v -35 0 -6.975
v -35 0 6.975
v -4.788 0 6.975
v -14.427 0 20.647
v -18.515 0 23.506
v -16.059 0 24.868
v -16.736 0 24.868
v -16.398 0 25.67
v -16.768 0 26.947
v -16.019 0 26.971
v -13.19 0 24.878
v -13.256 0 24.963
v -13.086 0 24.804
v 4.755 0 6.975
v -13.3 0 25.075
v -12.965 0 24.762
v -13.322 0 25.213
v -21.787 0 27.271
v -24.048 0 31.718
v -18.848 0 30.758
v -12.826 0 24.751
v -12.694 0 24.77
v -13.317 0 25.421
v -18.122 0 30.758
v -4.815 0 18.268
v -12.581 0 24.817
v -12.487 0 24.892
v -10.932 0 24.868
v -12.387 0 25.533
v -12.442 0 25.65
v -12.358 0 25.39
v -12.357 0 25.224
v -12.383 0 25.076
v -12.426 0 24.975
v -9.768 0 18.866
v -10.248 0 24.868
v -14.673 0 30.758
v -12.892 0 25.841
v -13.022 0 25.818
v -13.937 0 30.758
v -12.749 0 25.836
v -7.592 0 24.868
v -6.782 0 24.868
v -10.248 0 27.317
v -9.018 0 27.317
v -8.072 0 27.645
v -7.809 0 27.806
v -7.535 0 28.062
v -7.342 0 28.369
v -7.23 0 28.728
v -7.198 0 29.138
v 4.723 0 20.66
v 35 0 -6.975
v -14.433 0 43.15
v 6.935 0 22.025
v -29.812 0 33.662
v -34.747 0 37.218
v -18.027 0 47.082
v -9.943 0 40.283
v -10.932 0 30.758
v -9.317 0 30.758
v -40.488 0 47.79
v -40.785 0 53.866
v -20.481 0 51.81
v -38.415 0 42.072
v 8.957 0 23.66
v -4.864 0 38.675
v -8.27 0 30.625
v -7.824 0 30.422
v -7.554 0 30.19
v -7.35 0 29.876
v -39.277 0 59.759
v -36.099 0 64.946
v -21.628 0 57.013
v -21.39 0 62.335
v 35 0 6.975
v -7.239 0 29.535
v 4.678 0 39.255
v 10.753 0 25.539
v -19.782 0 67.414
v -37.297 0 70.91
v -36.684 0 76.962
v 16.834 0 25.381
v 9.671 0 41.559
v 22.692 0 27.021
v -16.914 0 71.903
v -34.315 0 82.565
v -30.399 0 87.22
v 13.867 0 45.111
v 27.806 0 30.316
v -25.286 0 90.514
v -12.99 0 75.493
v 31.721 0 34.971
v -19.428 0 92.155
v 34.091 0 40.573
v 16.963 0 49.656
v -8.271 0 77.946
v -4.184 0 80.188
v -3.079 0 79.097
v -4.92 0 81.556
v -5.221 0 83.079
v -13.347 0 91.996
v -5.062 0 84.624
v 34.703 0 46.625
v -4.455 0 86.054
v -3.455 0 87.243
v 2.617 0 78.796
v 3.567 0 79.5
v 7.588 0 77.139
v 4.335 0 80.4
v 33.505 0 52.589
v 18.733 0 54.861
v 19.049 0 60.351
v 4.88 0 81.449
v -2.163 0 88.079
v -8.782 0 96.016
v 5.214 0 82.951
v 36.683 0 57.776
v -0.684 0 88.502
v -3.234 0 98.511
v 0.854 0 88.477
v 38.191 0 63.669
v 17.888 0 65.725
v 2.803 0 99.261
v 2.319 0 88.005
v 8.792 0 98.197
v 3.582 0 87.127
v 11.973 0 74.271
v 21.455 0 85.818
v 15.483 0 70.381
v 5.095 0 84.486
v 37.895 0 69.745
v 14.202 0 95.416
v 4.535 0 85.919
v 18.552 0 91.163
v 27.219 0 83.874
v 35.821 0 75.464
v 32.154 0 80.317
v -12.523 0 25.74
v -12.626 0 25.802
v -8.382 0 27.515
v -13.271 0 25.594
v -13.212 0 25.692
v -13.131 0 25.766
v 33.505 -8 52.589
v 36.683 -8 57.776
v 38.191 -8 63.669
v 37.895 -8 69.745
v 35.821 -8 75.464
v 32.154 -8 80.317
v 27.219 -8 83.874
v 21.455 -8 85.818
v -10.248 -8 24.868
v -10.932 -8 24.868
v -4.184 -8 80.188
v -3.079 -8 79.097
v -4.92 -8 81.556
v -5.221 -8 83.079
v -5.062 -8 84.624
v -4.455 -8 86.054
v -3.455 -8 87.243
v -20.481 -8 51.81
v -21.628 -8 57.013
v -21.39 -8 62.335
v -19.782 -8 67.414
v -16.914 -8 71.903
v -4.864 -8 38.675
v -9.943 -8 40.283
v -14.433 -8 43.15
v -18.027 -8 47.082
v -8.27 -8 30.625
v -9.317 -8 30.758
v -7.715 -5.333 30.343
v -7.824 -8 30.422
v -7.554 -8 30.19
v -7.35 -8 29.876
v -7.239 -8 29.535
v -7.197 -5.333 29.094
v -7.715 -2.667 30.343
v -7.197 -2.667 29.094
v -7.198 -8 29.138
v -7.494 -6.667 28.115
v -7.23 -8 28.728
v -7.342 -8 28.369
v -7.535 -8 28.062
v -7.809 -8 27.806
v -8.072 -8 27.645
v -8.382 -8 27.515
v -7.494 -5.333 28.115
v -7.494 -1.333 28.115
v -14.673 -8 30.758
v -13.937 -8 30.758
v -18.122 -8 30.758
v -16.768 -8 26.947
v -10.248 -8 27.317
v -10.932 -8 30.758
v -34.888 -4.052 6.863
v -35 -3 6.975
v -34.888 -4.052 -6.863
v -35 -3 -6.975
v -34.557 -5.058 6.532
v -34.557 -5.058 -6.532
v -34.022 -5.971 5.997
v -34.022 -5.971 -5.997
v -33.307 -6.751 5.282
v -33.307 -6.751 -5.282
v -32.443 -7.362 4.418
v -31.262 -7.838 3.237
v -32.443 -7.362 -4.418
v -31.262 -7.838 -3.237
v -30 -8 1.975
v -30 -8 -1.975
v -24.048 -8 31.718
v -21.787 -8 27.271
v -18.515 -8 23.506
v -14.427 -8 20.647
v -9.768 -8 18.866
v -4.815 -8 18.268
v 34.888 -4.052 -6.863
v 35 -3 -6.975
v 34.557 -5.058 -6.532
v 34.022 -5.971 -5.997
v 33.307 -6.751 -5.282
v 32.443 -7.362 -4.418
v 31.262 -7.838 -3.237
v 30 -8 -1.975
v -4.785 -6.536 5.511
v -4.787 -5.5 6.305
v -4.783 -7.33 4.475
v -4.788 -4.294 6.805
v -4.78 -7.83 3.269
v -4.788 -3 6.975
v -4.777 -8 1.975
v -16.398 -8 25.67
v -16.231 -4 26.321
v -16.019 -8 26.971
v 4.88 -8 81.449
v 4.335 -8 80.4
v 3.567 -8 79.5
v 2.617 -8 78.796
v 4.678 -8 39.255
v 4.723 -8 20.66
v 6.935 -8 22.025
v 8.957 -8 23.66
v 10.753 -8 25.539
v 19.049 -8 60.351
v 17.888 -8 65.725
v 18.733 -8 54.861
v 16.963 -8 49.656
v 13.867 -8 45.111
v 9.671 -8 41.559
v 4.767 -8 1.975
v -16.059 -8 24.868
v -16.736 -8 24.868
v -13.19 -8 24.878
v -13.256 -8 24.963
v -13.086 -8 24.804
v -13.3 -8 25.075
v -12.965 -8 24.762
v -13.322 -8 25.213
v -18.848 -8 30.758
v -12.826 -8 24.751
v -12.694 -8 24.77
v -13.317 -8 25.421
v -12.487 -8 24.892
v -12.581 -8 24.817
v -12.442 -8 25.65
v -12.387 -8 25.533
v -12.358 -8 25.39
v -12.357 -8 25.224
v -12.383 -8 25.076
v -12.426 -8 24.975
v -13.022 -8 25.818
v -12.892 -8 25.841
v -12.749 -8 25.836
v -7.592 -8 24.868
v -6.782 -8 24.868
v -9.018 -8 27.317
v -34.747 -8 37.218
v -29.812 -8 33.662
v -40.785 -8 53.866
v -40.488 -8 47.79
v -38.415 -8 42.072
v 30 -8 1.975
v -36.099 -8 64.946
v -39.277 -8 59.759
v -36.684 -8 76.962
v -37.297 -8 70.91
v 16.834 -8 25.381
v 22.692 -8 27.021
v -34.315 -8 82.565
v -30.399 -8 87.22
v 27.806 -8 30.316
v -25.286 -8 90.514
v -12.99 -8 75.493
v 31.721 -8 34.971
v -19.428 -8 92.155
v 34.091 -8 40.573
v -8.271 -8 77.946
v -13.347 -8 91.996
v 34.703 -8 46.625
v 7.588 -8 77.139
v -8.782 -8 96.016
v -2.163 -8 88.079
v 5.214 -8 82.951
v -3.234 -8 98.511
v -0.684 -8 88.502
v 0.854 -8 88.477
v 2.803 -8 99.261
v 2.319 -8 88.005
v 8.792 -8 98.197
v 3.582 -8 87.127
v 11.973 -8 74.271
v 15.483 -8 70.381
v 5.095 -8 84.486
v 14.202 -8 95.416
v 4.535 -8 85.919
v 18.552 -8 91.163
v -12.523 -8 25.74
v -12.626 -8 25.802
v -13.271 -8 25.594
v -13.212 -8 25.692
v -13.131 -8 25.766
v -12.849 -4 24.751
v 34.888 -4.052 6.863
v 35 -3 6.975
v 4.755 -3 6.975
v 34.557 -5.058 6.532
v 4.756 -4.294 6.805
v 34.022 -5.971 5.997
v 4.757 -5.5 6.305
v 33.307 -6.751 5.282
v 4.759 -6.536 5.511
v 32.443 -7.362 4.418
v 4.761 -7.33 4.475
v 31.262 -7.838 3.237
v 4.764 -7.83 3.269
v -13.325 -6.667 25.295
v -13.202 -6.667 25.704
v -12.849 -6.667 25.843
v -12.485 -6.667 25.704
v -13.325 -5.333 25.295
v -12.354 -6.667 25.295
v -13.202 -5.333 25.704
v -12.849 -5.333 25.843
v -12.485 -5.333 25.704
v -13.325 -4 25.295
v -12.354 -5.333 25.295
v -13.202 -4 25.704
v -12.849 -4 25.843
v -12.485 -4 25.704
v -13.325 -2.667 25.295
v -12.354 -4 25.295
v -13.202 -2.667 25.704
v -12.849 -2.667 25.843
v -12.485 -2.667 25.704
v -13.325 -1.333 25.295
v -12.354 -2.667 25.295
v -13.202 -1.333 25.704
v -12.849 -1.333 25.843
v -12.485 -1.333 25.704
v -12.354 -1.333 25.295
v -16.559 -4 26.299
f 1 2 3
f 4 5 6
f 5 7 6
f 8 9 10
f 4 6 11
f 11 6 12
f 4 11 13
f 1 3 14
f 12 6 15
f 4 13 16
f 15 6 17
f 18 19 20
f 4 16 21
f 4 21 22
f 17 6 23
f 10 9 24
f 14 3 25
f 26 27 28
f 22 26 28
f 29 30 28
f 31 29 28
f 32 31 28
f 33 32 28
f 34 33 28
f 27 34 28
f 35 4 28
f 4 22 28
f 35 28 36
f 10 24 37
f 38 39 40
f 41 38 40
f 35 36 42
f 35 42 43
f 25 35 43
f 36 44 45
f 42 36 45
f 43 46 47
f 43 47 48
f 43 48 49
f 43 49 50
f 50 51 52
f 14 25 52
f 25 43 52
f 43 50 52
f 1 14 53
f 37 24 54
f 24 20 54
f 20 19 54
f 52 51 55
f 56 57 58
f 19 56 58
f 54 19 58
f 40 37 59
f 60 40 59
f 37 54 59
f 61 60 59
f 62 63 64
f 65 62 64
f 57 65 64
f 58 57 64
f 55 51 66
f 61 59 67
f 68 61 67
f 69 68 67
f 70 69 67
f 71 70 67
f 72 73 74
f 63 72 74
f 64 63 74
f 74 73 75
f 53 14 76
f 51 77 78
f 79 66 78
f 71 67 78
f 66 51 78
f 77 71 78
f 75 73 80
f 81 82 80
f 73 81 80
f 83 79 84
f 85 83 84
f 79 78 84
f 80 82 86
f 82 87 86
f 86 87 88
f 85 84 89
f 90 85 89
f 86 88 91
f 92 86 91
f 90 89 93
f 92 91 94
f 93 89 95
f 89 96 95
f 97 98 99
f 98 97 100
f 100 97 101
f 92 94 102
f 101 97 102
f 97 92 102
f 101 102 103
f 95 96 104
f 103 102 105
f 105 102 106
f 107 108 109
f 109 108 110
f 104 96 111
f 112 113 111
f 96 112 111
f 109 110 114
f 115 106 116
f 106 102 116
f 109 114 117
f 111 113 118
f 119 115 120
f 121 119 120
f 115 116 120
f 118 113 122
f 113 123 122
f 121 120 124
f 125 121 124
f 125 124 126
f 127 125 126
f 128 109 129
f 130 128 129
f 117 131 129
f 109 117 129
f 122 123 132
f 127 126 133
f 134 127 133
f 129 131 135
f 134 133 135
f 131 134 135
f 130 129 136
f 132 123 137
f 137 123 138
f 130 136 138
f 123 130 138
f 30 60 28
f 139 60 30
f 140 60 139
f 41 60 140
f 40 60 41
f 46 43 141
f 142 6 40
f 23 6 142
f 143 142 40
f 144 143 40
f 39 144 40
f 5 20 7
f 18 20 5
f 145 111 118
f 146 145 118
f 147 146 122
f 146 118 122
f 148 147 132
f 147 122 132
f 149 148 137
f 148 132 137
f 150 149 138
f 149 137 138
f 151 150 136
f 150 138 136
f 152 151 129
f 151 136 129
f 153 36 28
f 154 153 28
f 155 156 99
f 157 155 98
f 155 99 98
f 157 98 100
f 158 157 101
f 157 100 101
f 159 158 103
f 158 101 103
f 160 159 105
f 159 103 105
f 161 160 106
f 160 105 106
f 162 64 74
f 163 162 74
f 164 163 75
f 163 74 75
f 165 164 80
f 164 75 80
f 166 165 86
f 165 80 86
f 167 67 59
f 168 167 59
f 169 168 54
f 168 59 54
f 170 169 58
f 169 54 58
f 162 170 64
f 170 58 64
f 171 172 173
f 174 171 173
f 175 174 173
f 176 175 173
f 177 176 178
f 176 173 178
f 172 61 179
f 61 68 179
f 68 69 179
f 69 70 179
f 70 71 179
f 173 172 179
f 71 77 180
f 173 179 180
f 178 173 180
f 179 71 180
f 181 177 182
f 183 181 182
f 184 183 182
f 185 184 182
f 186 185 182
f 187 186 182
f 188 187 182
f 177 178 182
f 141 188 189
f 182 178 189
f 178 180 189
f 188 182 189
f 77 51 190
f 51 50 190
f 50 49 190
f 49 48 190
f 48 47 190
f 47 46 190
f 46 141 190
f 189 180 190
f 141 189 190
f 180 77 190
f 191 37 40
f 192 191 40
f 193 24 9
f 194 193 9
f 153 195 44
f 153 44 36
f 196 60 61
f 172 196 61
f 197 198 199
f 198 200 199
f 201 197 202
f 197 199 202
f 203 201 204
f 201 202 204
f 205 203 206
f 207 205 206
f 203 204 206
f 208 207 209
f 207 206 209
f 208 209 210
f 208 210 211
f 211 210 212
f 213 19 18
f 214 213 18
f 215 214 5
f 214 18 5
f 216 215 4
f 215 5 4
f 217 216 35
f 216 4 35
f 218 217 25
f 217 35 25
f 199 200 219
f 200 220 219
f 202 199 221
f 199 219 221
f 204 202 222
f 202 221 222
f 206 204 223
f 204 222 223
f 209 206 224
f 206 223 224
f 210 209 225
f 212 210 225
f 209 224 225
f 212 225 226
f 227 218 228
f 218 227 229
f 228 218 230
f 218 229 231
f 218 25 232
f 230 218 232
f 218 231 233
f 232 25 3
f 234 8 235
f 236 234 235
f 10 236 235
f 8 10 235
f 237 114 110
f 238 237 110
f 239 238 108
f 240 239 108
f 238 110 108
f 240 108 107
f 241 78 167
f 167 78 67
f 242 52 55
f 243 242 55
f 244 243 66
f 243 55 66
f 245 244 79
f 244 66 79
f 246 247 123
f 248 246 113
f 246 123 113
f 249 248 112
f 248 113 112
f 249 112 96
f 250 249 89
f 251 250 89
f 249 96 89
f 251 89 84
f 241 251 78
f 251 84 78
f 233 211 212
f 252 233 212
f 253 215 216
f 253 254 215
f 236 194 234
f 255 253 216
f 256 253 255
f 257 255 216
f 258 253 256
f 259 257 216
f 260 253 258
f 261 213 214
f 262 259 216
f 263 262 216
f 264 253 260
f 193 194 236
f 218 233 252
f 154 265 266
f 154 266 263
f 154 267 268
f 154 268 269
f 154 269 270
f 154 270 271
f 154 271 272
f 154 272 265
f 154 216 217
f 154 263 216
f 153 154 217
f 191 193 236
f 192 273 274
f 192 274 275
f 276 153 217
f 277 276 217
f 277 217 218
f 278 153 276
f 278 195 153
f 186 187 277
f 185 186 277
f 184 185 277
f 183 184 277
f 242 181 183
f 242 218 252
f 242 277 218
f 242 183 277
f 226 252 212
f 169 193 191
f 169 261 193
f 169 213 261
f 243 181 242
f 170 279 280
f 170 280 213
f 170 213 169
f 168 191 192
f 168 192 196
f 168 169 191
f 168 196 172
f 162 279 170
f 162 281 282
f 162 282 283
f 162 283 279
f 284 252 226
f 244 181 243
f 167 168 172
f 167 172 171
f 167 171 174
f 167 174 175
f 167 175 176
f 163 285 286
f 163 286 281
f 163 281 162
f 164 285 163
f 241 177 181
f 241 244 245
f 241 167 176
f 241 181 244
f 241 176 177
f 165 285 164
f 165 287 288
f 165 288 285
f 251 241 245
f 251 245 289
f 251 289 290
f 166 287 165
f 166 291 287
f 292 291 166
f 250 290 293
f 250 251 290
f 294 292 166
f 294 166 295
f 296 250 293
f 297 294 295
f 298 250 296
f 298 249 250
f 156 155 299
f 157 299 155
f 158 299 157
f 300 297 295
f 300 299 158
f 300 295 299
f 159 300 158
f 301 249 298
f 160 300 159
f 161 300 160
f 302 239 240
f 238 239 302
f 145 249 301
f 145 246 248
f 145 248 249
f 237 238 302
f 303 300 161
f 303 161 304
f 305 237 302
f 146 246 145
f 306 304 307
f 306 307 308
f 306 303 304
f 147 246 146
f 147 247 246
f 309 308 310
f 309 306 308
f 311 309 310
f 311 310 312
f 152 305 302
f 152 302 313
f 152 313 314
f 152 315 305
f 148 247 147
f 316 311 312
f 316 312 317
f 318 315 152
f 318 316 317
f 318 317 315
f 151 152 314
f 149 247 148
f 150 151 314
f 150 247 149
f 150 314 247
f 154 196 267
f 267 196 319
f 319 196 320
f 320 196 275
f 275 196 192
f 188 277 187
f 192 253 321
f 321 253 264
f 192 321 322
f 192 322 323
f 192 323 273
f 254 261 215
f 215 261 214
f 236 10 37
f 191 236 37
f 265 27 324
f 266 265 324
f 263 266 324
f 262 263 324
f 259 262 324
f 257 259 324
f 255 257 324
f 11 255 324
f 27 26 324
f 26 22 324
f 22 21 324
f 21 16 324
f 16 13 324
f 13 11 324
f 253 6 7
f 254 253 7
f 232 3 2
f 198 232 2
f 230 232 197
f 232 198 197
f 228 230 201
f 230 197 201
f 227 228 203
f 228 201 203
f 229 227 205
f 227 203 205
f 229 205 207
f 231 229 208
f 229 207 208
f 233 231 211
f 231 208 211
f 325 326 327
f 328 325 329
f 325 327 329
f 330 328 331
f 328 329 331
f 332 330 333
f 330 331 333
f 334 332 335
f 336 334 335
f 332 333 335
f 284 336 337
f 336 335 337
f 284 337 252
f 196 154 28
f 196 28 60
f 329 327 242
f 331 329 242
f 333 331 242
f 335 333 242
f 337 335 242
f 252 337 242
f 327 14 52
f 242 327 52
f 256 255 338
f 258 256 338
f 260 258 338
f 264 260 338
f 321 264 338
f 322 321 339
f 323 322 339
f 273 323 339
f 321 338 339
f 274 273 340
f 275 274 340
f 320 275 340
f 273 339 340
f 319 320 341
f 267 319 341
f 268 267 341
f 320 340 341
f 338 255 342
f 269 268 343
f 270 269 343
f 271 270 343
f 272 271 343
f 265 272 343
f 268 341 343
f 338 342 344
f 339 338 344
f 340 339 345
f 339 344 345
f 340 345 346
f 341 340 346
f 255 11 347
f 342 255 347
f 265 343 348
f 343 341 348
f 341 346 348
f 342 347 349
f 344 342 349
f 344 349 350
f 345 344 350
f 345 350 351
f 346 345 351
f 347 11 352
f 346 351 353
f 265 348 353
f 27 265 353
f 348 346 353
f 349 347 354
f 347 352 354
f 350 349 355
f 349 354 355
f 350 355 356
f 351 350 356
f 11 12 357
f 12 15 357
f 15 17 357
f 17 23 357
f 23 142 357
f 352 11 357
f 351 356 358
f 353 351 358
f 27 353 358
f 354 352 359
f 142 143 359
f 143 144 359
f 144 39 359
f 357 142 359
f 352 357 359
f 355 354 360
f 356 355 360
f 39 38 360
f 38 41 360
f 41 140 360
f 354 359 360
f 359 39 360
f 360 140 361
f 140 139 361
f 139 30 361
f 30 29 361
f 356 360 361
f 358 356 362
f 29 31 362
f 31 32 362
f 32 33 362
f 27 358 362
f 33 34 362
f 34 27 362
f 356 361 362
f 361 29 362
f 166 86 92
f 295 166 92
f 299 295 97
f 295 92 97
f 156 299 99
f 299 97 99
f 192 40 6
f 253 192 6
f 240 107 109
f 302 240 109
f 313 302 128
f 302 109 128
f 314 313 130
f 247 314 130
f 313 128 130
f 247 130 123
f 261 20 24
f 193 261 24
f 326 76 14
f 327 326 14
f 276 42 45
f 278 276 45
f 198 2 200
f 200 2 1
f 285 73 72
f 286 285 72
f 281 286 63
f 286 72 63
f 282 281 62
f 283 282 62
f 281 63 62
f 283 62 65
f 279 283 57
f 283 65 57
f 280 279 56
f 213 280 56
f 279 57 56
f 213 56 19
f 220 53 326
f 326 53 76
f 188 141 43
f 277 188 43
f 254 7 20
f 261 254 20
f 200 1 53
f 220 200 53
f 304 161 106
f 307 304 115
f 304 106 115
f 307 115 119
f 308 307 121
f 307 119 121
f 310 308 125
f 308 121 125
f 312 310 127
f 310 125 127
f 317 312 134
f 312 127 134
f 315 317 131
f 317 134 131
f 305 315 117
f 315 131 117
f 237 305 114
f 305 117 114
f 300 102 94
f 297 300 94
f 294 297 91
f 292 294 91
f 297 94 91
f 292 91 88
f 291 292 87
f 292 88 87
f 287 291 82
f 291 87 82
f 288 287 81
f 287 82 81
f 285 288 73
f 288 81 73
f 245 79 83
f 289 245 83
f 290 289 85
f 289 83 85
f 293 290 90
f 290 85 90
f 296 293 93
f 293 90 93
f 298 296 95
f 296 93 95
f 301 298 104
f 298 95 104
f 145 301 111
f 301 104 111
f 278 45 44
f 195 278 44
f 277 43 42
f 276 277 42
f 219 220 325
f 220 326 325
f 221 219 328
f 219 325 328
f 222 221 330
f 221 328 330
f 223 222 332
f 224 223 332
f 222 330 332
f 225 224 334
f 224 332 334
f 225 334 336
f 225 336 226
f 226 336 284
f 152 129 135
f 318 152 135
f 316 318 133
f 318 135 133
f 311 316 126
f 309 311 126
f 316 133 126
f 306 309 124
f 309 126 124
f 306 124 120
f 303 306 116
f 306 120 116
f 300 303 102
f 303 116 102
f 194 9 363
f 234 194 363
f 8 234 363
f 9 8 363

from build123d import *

# Parameters (mm, degrees)
F1_DEPTH = 8
F2_R     = 5


with BuildPart() as f1:
    # F0 (on Front) → F1 (new body)
    with BuildSketch(Plane.XZ):
        Polygon((-4.7884929424, 6.975), (-35, 6.975), (-35, -6.975), (-4.7552655505, -6.975), align=None)
        with BuildLine():
            Line((-4.815391477, 18.2679283934), (-4.7884929424, 6.975))
            Line((-4.7884929424, 6.975), (4.7552655505, 6.975))
            Line((4.7552655505, 6.975), (4.7226697487, 20.6598368154))
            ThreePointArc((4.7226697487, 20.6598368154), (0.0998647972, 18.880787826), (-4.815391477, 18.2679283934))
        make_face()
        Polygon((4.7552655505, 6.975), (-4.7884929424, 6.975), (-4.7552655505, -6.975), (4.7884929424, -6.975), align=None)
        Polygon((35, 6.975), (4.7552655505, 6.975), (4.7884929424, -6.975), (35, -6.975), align=None)
        with BuildLine():
            ThreePointArc((-24.048441977, 31.7176597434), (-16.5588212007, 21.9513310022), (-4.815391477, 18.2679283934))
            Line((-4.815391477, 18.2679283934), (-4.863998607, 38.674870505))
            ThreePointArc((-4.863998607, 38.674870505), (-13.5241307894, 32.6260370701), (-24.048441977, 31.7176597434))
        make_face()
        with BuildLine():
            add(Edge.make_bspline(
                [(-13.1900259225, 24.8776112918), (-13.3247436315, 25.0045940128), (-13.3247436315, 25.2946560658)],
                knots=[0, 0, 0, 1, 1, 1], degree=2))
            add(Edge.make_bspline(
                [(-13.3247436315, 25.2946560658), (-13.3247436315, 25.5653806485), (-13.2016284046, 25.7039658516)],
                knots=[0, 0, 0, 1, 1, 1], degree=2))
            add(Edge.make_bspline(
                [(-13.2016284046, 25.7039658516), (-13.0785131777, 25.8425510547), (-12.8490418647, 25.8425510547)],
                knots=[0, 0, 0, 1, 1, 1], degree=2))
            add(Edge.make_bspline(
                [(-12.8490418647, 25.8425510547), (-12.6157030576, 25.8425510547), (-12.4848528426, 25.7039658516)],
                knots=[0, 0, 0, 1, 1, 1], degree=2))
            add(Edge.make_bspline(
                [(-12.4848528426, 25.7039658516), (-12.3540026276, 25.5653806485), (-12.3540026276, 25.2946560658)],
                knots=[0, 0, 0, 1, 1, 1], degree=2))
            add(Edge.make_bspline(
                [(-12.3540026276, 25.2946560658), (-12.3540026276, 25.0329556358), (-12.4867865897, 24.8917921033)],
                knots=[0, 0, 0, 1, 1, 1], degree=2))
            add(Edge.make_bspline(
                [(-12.4867865897, 24.8917921033), (-12.6195705517, 24.7506285709), (-12.8490418647, 24.7506285709)],
                knots=[0, 0, 0, 1, 1, 1], degree=2))
            add(Edge.make_bspline(
                [(-12.8490418647, 24.7506285709), (-13.0553082135, 24.7506285709), (-13.1900259225, 24.8776112918)],
                knots=[0, 0, 0, 1, 1, 1], degree=2))
        make_face(mode=Mode.SUBTRACT)
        with BuildLine():
            Line((-16.0190978123, 26.9705701495), (-14.6732098866, 30.7581359787))
            Line((-14.6732098866, 30.7581359787), (-13.9370968544, 30.7581359787))
            Line((-13.9370968544, 30.7581359787), (-16.0590619174, 24.8679425567))
            Line((-16.0590619174, 24.8679425567), (-16.7358733743, 24.8679425567))
            Line((-16.7358733743, 24.8679425567), (-18.8475251198, 30.7581359787))
            Line((-18.8475251198, 30.7581359787), (-18.1217254051, 30.7581359787))
            Line((-18.1217254051, 30.7581359787), (-16.7681024913, 26.9473651853))
            add(Edge.make_bspline(
                [(-16.7681024913, 26.9473651853), (-16.5347636842, 26.2898911986), (-16.3981122282, 25.6698029876)],
                knots=[0, 0, 0, 1, 1, 1], degree=2))
            add(Edge.make_bspline(
                [(-16.3981122282, 25.6698029876), (-16.2524366193, 26.3221203156), (-16.0190978123, 26.9705701495)],
                knots=[0, 0, 0, 1, 1, 1], degree=2))
        make_face(mode=Mode.SUBTRACT)
        with BuildLine():
            Line((-9.0176444363, 27.3173554484), (-10.2475075409, 27.3173554484))
            Line((-10.2475075409, 27.3173554484), (-10.2475075409, 24.8679425567))
            Line((-10.2475075409, 24.8679425567), (-10.9320539858, 24.8679425567))
            Line((-10.9320539858, 24.8679425567), (-10.9320539858, 30.7581359787))
            Line((-10.9320539858, 30.7581359787), (-9.316730642, 30.7581359787))
            add(Edge.make_bspline(
                [(-9.316730642, 30.7581359787), (-8.2325431463, 30.7581359787), (-7.7149435274, 30.3430249518)],
                knots=[0, 0, 0, 1, 1, 1], degree=2))
            add(Edge.make_bspline(
                [(-7.7149435274, 30.3430249518), (-7.1973439085, 29.9279139249), (-7.1973439085, 29.0938243771)],
                knots=[0, 0, 0, 1, 1, 1], degree=2))
            add(Edge.make_bspline(
                [(-7.1973439085, 29.0938243771), (-7.1973439085, 27.9258411772), (-8.3820862492, 27.5145976444)],
                knots=[0, 0, 0, 1, 1, 1], degree=2))
            Line((-8.3820862492, 27.5145976444), (-6.7822328816, 24.8679425567))
            Line((-6.7822328816, 24.8679425567), (-7.5918283005, 24.8679425567))
            Line((-7.5918283005, 24.8679425567), (-9.0176444363, 27.3173554484))
        make_face(mode=Mode.SUBTRACT)
        with BuildLine():
            Line((-4.863998607, 38.674870505), (-4.815391477, 18.2679283934))
            ThreePointArc((-4.815391477, 18.2679283934), (0.0998647972, 18.880787826), (4.7226697487, 20.6598368154))
            Line((4.7226697487, 20.6598368154), (4.7060632326, 27.6318224688))
            Line((4.7060632326, 27.6318224688), (4.6783778732, 39.2550869399))
            Line((4.6783778732, 39.2550869399), (-4.863998607, 38.674870505))
        make_face()
        with BuildLine():
            Line((4.7060632326, 27.6318224688), (4.7226697487, 20.6598368154))
            ThreePointArc((4.7226697487, 20.6598368154), (7.9719953336, 22.8103532241), (10.7533443371, 25.5392605699))
            ThreePointArc((10.7533443371, 25.5392605699), (7.6471719178, 26.3470332103), (4.7060632326, 27.6318224688))
        make_face()
        with BuildLine():
            ThreePointArc((-24.048441977, 31.7176597434), (-13.5241307894, 32.6260370701), (-4.863998607, 38.674870505))
            ThreePointArc((-4.863998607, 38.674870505), (-14.4325081161, 43.1503482577), (-20.481341551, 51.8104804401))
            ThreePointArc((-20.481341551, 51.8104804401), (-24.9568193037, 42.241970931), (-24.048441977, 31.7176597434))
        make_face()
        with BuildLine():
            ThreePointArc((-36.0986844951, 64.9460903753), (-39.6657849211, 44.8532696785), (-24.048441977, 31.7176597434))
            ThreePointArc((-24.048441977, 31.7176597434), (-24.9568193037, 42.241970931), (-20.481341551, 51.8104804401))
            ThreePointArc((-20.481341551, 51.8104804401), (-30.0498510602, 56.2859581928), (-36.0986844951, 64.9460903753))
        make_face()
        with BuildLine():
            Line((4.6783778732, 39.2550869399), (4.7060632326, 27.6318224688))
            ThreePointArc((4.7060632326, 27.6318224688), (7.6471719178, 26.3470332103), (10.7533443371, 25.5392605699))
            ThreePointArc((10.7533443371, 25.5392605699), (15.2288220897, 35.107770079), (14.3204447631, 45.6320812666))
            ThreePointArc((14.3204447631, 45.6320812666), (9.9604022486, 41.7465620958), (4.6783778732, 39.2550869399))
        make_face()
        with BuildLine():
            ThreePointArc((14.3204447631, 45.6320812666), (15.2288220897, 35.107770079), (10.7533443371, 25.5392605699))
            ThreePointArc((10.7533443371, 25.5392605699), (29.9377877071, 32.4964713315), (33.5048881331, 52.5892920282))
            ThreePointArc((33.5048881331, 52.5892920282), (24.8447559507, 46.5404585933), (14.3204447631, 45.6320812666))
        make_face()
        with BuildLine():
            ThreePointArc((-36.0986844951, 64.9460903753), (-30.0498510602, 56.2859581928), (-20.481341551, 51.8104804401))
            ThreePointArc((-20.481341551, 51.8104804401), (-21.3897188777, 62.3347916277), (-16.914241125, 71.9033011369))
            ThreePointArc((-16.914241125, 71.9033011369), (-27.4385523126, 70.9949238102), (-36.0986844951, 64.9460903753))
        make_face()
        with BuildLine():
            ThreePointArc((-13.347140699, 91.9961218336), (-32.5315840691, 85.038911072), (-36.0986844951, 64.9460903753))
            ThreePointArc((-36.0986844951, 64.9460903753), (-27.4385523126, 70.9949238102), (-16.914241125, 71.9033011369))
            ThreePointArc((-16.914241125, 71.9033011369), (-17.8226184517, 82.4276123244), (-13.347140699, 91.9961218336))
        make_face()
        with BuildLine():
            ThreePointArc((17.8875451891, 65.7249019633), (18.7959225157, 55.2005907757), (14.3204447631, 45.6320812666))
            ThreePointArc((14.3204447631, 45.6320812666), (24.8447559507, 46.5404585933), (33.5048881331, 52.5892920282))
            ThreePointArc((33.5048881331, 52.5892920282), (27.4560546982, 61.2494242106), (17.8875451891, 65.7249019633))
        make_face()
        with BuildLine():
            ThreePointArc((17.8875451891, 65.7249019633), (27.4560546982, 61.2494242106), (33.5048881331, 52.5892920282))
            ThreePointArc((33.5048881331, 52.5892920282), (37.0719885591, 72.6821127249), (21.4546456151, 85.81772266))
            ThreePointArc((21.4546456151, 85.81772266), (22.3630229418, 75.2934114724), (17.8875451891, 65.7249019633))
        make_face()
        with BuildLine():
            ThreePointArc((-13.347140699, 91.9961218336), (-17.8226184517, 82.4276123244), (-16.914241125, 71.9033011369))
            ThreePointArc((-16.914241125, 71.9033011369), (-10.710686982, 76.8736634045), (-3.078749577, 79.0967505652))
            ThreePointArc((-3.078749577, 79.0967505652), (-5.2212274005, 83.0794109578), (-3.4549967043, 87.2426097465))
            ThreePointArc((-3.4549967043, 87.2426097465), (-8.0755153119, 90.296848239), (-13.347140699, 91.9961218336))
        make_face()
        with BuildLine():
            ThreePointArc((2.6166495696, 78.7959161107), (11.9730736035, 74.2710294822), (17.8875451891, 65.7249019633))
            ThreePointArc((17.8875451891, 65.7249019633), (22.3630229418, 75.2934114724), (21.4546456151, 85.81772266))
            ThreePointArc((21.4546456151, 85.81772266), (12.6866425633, 85.4580279417), (4.880367051, 81.4493722528))
            ThreePointArc((4.880367051, 81.4493722528), (3.9763704464, 79.9282503523), (2.6166495696, 78.7959161107))
        make_face()
        with BuildLine():
            ThreePointArc((21.4546456151, 85.81772266), (5.837302671, 98.9533325952), (-13.347140699, 91.9961218336))
            ThreePointArc((-13.347140699, 91.9961218336), (-8.0755153119, 90.296848239), (-3.4549967043, 87.2426097465))
            ThreePointArc((-3.4549967043, 87.2426097465), (2.1518386227, 88.0838664996), (5.2267939203, 83.3205729723))
            ThreePointArc((5.2267939203, 83.3205729723), (5.1394575354, 82.3690736675), (4.880367051, 81.4493722528))
            ThreePointArc((4.880367051, 81.4493722528), (12.6866425633, 85.4580279417), (21.4546456151, 85.81772266))
        make_face()
    extrude(amount=F1_DEPTH)

    # F2
    f2_edges = [f1.edges().sort_by_distance(p)[0] for p in [
        (-19.894246, -8, 6.975),
        (-35, -8, 0),
        (0, -8, -6.975),
        (35, -8, 0),
        (19.877633, -8, 6.975),
    ]]
    fillet(f2_edges, radius=F2_R)


solid = f1.part
